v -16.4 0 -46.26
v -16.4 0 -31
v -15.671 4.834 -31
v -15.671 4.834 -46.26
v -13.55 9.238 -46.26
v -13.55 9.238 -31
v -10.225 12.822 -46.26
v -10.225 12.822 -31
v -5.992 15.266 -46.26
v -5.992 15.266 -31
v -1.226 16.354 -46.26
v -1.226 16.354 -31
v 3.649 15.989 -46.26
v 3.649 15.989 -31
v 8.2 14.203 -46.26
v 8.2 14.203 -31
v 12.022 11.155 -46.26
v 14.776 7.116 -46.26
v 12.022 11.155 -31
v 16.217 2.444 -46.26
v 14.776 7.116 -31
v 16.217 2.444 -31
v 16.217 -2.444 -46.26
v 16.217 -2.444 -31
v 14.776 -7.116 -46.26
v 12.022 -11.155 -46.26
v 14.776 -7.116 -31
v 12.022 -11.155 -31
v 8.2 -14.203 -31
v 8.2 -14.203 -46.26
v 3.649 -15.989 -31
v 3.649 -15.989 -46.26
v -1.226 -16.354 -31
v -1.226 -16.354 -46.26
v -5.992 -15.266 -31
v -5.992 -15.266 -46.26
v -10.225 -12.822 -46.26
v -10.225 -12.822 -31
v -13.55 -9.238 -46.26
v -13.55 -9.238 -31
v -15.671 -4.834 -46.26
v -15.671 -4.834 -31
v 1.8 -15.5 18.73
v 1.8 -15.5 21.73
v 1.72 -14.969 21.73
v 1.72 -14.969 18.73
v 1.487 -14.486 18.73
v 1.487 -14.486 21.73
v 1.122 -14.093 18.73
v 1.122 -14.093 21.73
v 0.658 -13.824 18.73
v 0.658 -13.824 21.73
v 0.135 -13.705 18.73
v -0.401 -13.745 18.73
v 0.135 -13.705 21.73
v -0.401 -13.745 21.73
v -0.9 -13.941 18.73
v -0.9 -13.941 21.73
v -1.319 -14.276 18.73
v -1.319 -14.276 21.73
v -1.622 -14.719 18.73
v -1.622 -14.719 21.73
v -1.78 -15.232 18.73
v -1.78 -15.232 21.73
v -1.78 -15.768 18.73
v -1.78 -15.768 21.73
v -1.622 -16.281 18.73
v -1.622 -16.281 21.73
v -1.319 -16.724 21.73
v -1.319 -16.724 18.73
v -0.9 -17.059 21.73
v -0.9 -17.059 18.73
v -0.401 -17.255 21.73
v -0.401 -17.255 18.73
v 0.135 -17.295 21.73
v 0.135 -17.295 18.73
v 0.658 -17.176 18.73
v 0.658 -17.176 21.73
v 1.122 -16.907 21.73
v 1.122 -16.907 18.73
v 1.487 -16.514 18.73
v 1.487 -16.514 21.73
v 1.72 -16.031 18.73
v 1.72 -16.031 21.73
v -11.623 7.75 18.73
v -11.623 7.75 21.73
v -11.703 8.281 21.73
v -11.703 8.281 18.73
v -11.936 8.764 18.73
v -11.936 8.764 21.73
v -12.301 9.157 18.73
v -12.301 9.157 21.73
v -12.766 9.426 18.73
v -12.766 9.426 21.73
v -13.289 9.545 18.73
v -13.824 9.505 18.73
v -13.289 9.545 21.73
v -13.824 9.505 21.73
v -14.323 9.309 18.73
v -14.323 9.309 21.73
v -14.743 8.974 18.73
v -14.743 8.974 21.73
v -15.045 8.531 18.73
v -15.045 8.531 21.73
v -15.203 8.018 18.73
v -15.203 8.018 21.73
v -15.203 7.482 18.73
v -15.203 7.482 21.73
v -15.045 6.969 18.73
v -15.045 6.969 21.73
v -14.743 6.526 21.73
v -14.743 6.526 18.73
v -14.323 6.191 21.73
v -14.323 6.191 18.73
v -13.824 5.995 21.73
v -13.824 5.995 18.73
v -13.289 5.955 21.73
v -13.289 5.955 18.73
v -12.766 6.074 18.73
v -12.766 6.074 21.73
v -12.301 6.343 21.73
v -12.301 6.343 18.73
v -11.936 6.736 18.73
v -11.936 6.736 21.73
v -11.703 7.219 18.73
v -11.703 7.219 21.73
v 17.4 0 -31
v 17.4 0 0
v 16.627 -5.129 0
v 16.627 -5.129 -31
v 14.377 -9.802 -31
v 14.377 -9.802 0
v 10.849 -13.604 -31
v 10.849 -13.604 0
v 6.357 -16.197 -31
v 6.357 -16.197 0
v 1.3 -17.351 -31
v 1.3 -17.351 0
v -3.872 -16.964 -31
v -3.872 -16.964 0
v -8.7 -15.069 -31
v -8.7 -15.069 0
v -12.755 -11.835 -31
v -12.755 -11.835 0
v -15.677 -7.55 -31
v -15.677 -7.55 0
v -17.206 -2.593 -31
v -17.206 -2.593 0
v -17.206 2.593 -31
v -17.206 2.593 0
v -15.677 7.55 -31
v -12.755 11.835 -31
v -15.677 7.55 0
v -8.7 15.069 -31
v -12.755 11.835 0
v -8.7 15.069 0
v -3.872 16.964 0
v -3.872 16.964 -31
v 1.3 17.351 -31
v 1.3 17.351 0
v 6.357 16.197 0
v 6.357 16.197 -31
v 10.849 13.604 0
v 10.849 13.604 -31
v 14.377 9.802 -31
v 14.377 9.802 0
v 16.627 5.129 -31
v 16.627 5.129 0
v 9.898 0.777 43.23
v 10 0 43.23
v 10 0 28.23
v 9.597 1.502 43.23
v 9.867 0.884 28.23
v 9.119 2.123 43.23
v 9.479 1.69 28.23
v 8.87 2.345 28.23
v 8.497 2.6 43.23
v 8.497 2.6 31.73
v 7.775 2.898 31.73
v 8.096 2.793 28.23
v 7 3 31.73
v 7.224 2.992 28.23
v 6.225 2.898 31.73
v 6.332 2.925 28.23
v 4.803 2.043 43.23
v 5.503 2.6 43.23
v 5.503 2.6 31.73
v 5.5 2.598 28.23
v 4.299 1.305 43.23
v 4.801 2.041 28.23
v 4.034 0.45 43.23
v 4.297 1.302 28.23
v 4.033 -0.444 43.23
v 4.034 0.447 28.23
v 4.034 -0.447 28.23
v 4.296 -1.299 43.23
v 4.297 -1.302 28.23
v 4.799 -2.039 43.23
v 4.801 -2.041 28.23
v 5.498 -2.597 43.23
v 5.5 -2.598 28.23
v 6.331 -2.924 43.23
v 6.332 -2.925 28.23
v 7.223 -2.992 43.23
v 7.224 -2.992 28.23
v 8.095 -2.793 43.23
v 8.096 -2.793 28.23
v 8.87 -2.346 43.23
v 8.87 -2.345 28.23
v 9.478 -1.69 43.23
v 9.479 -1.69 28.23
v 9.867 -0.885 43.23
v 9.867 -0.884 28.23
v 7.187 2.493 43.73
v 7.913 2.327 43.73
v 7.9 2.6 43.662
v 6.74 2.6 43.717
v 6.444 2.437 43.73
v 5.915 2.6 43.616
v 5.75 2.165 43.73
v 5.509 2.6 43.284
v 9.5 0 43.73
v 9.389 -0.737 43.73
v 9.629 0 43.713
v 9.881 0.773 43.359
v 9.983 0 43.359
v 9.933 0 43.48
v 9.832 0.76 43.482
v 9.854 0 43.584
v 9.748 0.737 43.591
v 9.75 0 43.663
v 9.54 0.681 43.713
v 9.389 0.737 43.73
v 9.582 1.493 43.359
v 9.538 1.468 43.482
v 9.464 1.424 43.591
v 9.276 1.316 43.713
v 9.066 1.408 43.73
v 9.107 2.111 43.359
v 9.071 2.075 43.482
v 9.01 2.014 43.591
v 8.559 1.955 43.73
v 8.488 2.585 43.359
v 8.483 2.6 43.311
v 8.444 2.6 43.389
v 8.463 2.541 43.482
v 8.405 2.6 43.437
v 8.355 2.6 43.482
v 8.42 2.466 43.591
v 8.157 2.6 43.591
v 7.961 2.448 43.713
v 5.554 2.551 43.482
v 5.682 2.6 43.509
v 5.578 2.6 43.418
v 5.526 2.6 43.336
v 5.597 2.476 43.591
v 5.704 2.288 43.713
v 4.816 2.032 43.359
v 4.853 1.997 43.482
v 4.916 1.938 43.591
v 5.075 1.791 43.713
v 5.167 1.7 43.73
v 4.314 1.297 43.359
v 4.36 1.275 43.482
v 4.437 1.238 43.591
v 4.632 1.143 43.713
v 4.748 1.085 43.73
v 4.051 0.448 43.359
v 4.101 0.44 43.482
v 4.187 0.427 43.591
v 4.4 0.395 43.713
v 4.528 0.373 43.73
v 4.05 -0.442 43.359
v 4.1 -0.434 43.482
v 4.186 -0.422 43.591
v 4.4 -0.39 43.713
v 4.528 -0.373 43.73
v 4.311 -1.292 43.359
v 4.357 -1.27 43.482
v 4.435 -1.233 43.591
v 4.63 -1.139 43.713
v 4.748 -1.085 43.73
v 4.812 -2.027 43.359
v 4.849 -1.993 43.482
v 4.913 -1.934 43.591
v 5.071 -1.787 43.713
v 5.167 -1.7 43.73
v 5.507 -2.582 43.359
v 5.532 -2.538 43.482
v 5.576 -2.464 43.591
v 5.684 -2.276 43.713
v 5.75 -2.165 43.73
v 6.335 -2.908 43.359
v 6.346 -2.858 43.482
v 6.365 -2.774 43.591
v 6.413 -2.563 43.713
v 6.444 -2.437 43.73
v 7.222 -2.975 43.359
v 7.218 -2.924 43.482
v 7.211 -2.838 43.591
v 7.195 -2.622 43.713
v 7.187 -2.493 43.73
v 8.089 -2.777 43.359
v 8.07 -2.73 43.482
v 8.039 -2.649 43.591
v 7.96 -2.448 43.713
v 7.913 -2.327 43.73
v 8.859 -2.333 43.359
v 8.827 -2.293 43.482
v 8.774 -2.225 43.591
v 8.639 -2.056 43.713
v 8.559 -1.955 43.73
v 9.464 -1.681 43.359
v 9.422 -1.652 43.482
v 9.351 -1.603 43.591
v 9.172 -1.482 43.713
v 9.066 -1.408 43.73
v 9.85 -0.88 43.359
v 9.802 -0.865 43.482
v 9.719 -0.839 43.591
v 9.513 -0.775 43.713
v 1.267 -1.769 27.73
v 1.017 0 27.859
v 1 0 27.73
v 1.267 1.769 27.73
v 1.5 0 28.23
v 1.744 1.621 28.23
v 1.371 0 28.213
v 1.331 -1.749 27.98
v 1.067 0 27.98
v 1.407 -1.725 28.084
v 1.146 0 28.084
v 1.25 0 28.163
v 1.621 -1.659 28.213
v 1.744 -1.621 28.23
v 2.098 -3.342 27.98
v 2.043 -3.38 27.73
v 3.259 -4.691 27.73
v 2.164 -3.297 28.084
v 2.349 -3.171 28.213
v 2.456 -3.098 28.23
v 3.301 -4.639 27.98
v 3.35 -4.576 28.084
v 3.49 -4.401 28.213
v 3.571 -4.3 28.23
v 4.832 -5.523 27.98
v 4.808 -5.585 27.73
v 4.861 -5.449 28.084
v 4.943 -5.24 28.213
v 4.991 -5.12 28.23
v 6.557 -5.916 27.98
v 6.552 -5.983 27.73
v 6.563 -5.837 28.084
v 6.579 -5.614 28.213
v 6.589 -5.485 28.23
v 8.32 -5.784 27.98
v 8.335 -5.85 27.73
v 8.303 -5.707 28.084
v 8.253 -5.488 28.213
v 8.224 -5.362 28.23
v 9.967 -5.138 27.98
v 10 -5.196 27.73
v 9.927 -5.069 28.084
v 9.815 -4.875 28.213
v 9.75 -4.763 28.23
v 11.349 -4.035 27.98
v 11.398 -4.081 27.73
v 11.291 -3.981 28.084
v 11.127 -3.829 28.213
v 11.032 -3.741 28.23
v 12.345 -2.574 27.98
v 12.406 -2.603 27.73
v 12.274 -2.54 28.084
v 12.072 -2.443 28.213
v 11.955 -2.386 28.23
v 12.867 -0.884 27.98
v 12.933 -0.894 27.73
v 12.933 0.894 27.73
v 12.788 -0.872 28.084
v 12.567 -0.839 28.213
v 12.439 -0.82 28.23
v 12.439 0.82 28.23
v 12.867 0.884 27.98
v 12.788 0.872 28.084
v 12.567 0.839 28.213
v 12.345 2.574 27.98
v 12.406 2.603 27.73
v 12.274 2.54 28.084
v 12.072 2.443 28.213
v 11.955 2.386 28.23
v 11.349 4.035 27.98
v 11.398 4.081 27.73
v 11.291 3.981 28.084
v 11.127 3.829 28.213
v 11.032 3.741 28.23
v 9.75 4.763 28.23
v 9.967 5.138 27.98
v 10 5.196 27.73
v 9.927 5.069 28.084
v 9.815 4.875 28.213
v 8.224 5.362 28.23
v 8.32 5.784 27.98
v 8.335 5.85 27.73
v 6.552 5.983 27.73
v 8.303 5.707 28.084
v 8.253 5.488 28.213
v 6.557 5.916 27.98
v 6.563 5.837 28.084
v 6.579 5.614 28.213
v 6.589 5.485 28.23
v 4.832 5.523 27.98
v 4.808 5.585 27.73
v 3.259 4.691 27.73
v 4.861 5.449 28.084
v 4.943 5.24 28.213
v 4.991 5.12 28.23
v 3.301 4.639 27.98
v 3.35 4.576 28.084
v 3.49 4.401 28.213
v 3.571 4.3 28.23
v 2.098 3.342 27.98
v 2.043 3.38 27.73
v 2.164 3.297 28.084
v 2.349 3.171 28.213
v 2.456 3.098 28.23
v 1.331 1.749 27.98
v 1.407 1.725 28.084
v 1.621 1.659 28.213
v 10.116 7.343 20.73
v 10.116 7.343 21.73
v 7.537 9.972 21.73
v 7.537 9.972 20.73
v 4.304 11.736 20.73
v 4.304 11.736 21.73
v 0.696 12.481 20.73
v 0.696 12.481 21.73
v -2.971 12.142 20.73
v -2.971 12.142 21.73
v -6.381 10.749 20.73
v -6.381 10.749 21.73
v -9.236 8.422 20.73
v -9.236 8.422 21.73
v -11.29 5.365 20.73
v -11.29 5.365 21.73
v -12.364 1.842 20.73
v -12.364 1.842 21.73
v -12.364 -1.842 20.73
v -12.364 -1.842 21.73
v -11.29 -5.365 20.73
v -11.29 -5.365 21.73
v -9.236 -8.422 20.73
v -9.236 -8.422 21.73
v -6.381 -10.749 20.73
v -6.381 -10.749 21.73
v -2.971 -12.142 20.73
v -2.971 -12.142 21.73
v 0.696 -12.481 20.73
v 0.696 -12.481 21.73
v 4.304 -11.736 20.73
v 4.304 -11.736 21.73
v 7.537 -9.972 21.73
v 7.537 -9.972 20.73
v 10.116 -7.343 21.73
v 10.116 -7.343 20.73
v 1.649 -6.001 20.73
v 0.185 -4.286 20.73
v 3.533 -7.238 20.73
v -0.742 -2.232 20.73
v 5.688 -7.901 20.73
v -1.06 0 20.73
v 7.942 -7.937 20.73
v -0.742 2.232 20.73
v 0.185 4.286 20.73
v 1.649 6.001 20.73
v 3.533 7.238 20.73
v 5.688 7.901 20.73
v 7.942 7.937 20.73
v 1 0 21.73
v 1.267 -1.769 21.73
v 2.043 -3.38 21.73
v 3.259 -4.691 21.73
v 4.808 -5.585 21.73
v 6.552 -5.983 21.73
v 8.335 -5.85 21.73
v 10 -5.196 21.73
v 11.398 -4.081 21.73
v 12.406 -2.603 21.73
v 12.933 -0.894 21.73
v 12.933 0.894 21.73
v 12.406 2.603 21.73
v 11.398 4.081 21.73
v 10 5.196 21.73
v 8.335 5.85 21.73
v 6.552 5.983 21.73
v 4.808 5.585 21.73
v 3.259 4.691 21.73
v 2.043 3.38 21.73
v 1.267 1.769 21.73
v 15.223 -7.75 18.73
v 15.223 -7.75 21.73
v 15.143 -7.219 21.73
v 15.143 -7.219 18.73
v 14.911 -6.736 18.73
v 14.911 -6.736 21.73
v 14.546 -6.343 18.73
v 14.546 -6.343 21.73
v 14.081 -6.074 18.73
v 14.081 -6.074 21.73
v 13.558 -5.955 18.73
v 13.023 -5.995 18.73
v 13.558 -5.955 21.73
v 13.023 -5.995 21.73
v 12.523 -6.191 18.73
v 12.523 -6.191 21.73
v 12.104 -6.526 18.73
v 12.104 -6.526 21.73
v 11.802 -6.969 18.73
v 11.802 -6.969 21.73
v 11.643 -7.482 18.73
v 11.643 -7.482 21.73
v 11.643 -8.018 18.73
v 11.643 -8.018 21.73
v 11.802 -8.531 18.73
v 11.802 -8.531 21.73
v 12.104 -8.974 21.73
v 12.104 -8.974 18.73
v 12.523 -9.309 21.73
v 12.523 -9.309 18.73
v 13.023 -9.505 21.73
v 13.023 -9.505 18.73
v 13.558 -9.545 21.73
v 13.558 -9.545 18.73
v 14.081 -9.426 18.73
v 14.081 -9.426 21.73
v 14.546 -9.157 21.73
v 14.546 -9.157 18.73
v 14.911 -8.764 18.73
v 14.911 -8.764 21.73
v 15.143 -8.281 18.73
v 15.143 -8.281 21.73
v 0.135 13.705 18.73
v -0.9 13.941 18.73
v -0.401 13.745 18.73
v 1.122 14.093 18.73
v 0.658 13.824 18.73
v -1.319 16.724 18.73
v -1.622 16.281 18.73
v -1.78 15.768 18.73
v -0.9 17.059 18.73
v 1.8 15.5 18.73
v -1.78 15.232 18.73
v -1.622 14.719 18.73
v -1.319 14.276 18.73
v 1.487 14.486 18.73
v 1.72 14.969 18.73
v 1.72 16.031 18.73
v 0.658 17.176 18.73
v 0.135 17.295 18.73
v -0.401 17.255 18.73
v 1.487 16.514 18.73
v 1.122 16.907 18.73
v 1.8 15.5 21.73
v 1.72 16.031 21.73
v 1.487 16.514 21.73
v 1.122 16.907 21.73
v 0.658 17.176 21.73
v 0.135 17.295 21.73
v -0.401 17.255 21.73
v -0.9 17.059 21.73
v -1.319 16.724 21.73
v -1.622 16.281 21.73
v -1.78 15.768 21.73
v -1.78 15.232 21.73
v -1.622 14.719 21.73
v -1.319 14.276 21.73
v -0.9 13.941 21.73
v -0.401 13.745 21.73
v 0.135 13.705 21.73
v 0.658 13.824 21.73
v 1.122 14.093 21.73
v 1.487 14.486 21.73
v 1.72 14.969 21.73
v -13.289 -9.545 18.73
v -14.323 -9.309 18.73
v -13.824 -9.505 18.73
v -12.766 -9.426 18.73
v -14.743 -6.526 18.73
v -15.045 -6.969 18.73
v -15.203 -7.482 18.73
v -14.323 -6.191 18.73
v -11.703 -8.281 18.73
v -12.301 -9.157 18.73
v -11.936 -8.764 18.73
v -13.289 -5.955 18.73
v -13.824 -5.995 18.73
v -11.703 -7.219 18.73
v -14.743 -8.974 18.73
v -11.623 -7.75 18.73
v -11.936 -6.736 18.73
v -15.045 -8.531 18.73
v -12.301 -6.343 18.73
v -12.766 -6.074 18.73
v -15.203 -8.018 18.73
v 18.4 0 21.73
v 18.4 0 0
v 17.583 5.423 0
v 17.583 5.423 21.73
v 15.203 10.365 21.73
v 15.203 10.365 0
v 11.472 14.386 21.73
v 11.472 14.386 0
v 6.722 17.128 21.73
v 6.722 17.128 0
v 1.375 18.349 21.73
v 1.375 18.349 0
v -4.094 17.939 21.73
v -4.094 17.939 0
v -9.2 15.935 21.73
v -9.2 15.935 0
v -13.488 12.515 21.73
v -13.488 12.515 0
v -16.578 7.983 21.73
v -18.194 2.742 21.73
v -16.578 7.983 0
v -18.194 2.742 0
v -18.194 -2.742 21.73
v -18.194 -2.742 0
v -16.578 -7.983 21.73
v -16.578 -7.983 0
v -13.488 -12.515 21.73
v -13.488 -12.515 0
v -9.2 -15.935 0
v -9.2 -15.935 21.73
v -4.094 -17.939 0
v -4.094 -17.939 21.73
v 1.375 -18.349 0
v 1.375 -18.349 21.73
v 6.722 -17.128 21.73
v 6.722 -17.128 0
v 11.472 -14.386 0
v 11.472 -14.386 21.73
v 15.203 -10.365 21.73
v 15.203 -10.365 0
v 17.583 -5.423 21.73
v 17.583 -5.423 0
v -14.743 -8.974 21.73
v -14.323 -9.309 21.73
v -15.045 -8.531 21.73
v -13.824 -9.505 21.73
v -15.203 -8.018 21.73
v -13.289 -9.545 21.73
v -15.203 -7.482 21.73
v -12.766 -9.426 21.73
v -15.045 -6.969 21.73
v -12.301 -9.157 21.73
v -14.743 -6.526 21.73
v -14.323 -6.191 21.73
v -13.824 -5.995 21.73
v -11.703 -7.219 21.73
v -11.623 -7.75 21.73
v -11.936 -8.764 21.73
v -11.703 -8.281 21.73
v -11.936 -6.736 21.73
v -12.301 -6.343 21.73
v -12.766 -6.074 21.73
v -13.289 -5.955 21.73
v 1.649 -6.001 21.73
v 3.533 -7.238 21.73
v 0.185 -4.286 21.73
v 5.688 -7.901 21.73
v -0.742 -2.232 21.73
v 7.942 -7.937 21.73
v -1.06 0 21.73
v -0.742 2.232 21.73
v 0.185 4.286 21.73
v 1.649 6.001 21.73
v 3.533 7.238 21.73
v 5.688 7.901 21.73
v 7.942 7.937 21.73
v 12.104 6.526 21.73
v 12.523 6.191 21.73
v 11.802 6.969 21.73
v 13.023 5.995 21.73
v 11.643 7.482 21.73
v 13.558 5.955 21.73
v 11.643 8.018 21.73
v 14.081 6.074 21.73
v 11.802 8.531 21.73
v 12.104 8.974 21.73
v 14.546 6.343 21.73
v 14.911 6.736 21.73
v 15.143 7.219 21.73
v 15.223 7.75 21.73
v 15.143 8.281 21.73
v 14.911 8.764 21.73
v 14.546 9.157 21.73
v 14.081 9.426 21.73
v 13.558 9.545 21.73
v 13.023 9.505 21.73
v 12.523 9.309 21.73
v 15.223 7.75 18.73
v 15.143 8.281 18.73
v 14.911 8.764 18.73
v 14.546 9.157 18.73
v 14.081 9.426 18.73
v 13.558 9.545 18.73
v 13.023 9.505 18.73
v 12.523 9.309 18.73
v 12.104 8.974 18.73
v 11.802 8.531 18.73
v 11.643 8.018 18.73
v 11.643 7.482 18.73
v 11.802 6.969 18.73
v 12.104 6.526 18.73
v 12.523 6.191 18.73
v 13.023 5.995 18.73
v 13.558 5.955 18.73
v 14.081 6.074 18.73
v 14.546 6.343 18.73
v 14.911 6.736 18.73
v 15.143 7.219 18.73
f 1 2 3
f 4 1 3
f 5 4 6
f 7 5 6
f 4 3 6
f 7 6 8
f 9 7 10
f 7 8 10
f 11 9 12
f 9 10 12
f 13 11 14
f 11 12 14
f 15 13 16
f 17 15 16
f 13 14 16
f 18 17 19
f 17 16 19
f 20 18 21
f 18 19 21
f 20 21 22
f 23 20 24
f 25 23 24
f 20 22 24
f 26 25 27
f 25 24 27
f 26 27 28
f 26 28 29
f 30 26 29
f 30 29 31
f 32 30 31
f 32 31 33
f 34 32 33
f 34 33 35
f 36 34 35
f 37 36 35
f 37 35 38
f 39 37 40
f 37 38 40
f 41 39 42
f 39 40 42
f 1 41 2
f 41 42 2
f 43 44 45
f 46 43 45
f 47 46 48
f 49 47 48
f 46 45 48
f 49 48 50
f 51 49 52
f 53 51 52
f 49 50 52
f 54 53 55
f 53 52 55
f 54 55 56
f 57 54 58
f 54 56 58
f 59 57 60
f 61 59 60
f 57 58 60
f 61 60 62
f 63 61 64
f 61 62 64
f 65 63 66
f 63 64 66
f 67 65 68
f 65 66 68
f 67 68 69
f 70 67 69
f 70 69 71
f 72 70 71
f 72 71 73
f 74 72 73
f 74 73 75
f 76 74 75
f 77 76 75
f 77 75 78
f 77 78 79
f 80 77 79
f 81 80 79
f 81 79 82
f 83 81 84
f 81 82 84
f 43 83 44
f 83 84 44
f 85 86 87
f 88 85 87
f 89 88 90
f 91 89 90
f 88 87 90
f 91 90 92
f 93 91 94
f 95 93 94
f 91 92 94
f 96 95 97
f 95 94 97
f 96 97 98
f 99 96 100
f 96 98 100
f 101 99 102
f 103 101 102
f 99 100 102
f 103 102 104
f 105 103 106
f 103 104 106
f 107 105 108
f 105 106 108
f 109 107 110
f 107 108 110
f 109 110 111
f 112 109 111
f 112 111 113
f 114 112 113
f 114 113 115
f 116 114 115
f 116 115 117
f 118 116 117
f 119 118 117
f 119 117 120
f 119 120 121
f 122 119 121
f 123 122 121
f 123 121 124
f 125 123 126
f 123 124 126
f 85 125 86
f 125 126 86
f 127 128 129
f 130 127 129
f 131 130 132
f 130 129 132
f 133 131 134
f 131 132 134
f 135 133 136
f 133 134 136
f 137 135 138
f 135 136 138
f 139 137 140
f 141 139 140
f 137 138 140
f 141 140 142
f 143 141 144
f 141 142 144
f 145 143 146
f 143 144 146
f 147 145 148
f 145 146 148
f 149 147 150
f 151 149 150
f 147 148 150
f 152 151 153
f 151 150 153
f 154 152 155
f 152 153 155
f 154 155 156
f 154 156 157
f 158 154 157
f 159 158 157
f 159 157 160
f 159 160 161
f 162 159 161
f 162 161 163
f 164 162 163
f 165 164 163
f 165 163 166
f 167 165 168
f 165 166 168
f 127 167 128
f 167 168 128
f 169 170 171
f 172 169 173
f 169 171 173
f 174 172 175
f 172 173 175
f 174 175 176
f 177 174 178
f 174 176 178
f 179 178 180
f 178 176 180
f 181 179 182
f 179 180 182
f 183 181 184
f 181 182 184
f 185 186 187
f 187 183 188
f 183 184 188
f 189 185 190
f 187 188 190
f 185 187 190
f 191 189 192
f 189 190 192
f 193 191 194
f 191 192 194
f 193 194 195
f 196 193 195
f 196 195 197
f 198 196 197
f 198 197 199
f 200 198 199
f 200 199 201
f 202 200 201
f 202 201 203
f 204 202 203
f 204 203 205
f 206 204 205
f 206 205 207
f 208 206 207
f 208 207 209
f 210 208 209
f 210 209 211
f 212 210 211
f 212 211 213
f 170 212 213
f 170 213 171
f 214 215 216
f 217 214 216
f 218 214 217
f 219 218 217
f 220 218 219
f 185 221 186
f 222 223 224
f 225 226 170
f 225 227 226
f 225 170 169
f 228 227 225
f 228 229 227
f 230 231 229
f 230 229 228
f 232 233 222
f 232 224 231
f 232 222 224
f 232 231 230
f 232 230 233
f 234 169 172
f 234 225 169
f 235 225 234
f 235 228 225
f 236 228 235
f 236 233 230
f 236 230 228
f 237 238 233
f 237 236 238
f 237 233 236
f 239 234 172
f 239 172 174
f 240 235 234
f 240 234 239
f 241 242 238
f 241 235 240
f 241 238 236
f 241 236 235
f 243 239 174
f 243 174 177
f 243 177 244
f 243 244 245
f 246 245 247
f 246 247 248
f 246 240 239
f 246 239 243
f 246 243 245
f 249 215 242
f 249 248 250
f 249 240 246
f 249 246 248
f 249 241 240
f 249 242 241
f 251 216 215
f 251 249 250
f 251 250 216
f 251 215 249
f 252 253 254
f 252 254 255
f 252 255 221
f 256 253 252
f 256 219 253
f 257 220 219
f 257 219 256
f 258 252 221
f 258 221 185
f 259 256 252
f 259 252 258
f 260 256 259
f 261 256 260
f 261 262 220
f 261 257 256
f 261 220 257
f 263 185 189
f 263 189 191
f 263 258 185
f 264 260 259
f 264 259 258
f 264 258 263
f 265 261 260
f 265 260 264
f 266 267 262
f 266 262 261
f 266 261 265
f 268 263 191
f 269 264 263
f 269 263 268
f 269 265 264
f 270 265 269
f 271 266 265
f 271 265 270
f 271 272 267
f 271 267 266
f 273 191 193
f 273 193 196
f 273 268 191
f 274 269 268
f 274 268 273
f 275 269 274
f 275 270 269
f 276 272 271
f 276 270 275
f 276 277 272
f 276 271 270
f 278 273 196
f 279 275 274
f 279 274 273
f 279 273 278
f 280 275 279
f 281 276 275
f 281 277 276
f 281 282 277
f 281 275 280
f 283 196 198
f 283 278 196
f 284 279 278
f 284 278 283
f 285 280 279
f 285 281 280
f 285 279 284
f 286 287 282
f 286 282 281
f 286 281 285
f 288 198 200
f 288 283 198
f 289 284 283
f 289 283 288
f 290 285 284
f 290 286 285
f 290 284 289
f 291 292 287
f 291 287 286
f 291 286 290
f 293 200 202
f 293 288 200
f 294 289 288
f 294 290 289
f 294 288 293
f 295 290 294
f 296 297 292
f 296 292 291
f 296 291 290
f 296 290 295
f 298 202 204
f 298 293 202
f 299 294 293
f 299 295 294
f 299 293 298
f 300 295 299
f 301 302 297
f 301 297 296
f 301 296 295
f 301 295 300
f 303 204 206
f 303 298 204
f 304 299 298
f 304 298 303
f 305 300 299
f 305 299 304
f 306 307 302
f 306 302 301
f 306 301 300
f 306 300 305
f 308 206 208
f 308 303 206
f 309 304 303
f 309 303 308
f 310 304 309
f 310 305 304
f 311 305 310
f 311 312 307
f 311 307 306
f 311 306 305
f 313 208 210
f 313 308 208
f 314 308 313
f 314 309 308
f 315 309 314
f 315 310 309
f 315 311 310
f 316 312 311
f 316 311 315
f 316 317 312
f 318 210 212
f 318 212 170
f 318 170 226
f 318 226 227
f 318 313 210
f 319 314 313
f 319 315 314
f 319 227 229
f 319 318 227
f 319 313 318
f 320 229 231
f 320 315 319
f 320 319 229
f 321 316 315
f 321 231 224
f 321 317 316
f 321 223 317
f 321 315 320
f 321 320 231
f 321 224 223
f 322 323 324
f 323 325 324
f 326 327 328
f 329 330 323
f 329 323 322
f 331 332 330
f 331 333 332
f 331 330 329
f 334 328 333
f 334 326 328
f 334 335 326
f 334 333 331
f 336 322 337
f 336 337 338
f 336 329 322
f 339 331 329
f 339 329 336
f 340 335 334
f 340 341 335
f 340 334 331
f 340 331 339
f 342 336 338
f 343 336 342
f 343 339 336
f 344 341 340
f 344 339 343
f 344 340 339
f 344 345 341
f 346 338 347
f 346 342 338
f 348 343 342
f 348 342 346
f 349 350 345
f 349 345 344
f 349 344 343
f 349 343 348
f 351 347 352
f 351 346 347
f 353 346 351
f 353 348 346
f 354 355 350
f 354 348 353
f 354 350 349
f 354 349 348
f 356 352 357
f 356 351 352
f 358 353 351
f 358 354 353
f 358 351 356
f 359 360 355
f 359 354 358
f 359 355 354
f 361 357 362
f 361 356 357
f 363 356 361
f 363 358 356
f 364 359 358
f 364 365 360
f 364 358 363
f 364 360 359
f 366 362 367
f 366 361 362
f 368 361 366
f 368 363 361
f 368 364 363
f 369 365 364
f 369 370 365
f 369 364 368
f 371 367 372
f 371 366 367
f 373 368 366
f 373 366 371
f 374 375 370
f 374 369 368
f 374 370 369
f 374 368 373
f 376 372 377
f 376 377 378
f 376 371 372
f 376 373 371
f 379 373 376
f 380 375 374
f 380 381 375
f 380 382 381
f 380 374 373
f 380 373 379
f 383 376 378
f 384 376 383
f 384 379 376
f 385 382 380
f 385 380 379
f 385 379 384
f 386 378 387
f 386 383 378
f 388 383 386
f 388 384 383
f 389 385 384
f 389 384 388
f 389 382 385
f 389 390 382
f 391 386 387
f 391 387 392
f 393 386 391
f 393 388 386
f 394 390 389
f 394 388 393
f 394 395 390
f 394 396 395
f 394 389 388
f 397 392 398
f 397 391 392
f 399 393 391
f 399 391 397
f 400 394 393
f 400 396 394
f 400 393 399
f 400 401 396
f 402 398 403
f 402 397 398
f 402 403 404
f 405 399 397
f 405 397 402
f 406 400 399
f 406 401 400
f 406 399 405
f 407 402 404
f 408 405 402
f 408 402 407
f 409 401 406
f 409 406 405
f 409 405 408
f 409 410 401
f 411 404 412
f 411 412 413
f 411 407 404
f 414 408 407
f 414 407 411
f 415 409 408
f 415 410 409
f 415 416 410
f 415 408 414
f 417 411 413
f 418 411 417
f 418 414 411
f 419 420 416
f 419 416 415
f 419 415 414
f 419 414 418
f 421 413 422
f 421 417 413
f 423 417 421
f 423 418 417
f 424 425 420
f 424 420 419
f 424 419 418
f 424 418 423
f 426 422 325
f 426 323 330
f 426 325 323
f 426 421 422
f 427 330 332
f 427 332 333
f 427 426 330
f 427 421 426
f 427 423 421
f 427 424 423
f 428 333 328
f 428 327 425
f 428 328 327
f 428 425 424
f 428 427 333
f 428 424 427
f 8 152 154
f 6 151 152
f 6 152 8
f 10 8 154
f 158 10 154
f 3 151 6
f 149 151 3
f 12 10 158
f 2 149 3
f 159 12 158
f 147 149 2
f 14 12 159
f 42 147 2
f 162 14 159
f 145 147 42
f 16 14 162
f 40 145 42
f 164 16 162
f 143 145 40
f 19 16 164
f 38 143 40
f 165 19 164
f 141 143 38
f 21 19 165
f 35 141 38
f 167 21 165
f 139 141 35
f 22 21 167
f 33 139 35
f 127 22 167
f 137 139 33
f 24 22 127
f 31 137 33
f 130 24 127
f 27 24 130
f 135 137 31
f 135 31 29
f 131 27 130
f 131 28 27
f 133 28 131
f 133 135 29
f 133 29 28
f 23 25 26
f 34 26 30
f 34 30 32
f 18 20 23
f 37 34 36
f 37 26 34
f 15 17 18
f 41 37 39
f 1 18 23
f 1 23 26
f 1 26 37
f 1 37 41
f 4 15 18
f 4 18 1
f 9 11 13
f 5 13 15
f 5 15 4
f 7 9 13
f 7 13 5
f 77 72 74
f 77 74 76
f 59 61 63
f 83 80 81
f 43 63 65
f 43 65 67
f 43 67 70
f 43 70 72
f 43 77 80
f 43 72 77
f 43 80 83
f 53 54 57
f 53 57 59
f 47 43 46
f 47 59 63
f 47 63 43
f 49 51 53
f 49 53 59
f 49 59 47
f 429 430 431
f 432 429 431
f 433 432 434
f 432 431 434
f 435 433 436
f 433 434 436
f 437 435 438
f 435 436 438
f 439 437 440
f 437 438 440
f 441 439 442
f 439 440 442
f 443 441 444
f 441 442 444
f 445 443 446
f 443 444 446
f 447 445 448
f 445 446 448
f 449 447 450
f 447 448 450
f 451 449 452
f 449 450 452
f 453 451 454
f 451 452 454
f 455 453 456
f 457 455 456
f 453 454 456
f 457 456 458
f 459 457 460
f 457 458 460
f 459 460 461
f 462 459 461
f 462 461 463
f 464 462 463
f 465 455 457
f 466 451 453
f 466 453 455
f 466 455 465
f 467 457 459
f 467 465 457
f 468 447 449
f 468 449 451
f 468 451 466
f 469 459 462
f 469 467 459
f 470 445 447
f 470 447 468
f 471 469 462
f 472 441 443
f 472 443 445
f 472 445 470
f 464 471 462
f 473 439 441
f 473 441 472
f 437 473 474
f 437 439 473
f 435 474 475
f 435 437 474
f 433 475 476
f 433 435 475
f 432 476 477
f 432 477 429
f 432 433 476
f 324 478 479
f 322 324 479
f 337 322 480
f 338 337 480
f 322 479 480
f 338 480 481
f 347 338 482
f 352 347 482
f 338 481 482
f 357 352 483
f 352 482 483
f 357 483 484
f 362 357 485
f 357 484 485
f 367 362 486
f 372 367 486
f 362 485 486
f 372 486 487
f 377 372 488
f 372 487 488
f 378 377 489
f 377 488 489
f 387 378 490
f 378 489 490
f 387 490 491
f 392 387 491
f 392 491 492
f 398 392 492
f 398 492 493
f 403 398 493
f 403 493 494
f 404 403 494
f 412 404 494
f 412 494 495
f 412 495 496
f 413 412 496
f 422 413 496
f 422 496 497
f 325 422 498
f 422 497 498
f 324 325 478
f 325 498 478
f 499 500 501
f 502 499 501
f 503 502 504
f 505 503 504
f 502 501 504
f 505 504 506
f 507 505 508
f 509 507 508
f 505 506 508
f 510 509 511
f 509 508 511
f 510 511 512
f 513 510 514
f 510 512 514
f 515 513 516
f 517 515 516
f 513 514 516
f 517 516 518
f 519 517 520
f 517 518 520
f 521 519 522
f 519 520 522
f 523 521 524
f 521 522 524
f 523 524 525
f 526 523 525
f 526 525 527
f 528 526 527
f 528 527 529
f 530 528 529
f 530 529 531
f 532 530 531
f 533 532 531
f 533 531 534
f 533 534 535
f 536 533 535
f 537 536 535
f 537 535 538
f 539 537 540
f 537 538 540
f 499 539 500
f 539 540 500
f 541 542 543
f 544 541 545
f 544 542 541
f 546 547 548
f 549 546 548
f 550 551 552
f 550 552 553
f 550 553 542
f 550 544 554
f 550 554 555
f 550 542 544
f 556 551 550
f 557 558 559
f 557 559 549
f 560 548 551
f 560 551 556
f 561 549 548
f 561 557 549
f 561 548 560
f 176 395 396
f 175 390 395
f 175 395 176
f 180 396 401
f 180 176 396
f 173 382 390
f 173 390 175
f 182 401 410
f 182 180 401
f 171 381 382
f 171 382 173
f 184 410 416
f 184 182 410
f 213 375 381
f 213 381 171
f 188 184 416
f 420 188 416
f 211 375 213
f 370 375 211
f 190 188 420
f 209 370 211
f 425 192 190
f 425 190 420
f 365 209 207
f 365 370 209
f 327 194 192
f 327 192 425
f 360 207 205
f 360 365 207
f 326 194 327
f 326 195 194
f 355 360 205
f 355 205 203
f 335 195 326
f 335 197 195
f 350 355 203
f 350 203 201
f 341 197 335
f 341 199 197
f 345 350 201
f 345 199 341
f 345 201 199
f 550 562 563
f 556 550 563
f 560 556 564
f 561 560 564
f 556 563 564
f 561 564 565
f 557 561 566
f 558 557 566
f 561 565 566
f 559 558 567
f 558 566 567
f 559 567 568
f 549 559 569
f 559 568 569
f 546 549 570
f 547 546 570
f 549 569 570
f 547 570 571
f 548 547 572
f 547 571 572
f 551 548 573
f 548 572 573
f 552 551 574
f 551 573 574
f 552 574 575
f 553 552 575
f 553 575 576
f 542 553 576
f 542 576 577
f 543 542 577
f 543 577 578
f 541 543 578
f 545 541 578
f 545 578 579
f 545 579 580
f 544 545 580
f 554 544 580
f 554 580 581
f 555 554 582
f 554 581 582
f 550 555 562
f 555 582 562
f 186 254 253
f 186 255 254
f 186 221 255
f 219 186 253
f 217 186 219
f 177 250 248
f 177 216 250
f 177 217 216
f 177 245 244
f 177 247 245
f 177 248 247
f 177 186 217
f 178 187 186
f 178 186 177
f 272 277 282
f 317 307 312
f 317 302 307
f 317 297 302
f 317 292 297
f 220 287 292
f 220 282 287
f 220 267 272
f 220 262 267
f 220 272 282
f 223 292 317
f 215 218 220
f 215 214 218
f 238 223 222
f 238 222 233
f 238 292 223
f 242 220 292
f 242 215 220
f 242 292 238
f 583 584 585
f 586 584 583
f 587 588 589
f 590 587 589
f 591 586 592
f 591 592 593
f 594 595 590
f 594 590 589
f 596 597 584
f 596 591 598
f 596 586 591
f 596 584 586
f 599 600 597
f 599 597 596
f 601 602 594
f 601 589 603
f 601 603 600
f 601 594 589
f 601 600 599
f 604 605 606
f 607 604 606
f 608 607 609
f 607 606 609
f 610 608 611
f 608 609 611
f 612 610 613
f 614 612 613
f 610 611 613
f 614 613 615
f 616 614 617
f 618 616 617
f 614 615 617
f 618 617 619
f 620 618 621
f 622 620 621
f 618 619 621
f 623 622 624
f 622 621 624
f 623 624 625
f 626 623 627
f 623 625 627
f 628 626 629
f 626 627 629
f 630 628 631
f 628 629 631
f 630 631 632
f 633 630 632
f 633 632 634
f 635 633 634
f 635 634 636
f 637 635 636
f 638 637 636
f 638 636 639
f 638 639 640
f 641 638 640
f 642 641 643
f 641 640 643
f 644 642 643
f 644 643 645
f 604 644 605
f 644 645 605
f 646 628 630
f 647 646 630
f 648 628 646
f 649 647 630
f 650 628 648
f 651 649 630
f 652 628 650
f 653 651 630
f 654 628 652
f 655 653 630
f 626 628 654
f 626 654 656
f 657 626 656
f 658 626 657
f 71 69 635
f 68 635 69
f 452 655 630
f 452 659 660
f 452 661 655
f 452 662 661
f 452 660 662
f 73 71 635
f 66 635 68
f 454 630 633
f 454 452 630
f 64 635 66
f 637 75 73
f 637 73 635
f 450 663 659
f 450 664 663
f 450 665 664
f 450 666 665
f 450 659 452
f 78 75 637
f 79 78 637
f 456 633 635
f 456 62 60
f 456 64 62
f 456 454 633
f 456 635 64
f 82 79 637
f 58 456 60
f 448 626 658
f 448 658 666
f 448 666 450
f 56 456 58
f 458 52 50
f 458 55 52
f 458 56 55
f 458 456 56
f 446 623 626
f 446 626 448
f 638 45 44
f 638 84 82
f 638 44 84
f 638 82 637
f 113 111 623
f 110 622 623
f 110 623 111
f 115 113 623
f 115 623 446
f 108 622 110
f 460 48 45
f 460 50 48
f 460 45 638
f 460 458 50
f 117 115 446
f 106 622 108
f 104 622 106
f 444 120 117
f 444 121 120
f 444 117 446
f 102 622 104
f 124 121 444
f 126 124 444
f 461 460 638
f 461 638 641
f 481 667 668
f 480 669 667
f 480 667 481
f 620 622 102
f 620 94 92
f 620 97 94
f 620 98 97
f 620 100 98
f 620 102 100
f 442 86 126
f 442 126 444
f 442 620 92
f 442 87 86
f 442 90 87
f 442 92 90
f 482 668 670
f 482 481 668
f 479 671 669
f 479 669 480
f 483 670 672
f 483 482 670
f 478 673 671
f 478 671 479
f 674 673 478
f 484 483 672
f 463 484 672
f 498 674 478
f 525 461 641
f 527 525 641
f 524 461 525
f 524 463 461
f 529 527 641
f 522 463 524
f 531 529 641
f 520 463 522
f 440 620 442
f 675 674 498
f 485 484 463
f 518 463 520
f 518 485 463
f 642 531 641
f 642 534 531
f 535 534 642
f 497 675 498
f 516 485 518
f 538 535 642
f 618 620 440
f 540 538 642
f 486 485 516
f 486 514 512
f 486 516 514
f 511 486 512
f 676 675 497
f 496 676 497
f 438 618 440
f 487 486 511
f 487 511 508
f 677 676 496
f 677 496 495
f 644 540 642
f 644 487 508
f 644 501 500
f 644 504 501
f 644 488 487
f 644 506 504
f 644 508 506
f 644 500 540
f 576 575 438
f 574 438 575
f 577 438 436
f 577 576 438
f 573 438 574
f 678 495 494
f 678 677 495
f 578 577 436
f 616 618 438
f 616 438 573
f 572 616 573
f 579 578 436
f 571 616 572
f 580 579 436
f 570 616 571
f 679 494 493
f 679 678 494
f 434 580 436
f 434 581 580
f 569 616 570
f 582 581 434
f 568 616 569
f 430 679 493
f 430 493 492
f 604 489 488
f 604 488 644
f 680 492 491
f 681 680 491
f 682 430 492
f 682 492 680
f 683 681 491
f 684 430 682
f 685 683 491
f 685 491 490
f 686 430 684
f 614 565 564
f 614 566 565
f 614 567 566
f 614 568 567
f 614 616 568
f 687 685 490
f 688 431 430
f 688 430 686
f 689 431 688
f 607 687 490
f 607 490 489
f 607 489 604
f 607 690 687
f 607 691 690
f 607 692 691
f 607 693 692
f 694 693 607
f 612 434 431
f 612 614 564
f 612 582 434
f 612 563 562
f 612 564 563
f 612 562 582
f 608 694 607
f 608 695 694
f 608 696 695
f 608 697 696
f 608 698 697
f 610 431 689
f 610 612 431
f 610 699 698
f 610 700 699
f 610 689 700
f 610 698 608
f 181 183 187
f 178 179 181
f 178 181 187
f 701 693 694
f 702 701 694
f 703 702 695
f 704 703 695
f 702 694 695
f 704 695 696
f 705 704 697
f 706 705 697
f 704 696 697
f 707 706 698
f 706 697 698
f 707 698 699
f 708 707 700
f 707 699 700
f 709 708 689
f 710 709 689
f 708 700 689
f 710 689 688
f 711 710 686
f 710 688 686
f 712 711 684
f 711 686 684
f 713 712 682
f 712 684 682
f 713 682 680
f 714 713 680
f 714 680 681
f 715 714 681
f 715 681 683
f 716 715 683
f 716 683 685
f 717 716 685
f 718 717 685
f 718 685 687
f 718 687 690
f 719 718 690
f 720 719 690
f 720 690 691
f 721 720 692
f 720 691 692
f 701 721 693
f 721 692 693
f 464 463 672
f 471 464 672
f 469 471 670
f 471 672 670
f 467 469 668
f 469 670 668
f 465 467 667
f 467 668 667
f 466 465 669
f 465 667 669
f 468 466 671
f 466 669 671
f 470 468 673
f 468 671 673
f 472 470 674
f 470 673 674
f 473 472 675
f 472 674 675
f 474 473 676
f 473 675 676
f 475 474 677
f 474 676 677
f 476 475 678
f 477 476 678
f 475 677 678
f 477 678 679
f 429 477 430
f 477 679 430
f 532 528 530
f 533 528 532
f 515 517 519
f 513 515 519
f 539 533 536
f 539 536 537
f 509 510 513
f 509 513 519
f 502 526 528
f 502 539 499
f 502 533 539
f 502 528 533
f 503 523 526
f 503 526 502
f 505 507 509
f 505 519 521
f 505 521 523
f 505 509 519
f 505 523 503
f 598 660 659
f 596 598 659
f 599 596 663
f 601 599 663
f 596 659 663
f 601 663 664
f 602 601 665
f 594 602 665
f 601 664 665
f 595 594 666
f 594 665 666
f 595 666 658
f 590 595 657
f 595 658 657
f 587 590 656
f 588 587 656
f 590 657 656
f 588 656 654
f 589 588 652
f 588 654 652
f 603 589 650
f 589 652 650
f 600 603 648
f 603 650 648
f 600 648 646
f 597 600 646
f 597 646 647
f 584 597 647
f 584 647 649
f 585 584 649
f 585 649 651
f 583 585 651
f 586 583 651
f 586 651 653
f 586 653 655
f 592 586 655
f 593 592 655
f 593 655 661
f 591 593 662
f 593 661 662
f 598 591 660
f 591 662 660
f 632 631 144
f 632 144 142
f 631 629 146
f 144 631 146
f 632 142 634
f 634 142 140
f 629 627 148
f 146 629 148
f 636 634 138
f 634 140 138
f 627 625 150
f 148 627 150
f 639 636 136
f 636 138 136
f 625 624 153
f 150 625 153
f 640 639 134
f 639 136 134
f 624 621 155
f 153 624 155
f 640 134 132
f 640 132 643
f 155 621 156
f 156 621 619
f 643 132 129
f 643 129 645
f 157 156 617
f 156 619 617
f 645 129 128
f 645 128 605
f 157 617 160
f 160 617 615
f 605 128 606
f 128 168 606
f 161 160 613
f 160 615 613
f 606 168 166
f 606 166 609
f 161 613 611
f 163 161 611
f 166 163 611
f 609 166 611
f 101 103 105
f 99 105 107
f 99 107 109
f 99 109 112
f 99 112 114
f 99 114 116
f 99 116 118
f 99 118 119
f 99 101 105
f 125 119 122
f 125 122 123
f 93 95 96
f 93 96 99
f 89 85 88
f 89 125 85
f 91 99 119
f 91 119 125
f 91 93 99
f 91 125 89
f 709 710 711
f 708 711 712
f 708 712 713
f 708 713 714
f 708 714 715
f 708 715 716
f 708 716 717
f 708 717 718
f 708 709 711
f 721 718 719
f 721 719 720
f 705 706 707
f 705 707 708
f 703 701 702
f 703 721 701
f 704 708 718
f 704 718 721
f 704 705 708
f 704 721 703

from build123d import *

# Parameters (mm, degrees)
SKETCH1_R            = 18.4
BOSS_EXTRUDE1_DEPTH  = 21.73
SKETCH2_R            = 17.4
BOSS_EXTRUDE2_DEPTH  = 31
SKETCH3_R            = 6
BOSS_EXTRUDE3_DEPTH  = 6.5
FILLET1_R            = 0.5
SKETCH4_R            = 3
BOSS_EXTRUDE4_DEPTH  = 15.5
CUT_EXTRUDE1_START   = -12
CUT_EXTRUDE1_DEPTH   = 12
CUT_EXTRUDE2_DEPTH   = 1
SKETCH9_R            = 4
BOSS_EXTRUDE5_DEPTH  = 1
FILLET2_R            = 0.5
SKETCH10_R           = 14
BOSS_EXTRUDE6_DEPTH  = 1.5
SKETCH11_W           = 3.5
SKETCH11_H           = 1
BOSS_EXTRUDE7_DEPTH  = 5.6
FILLET3_R            = 0.5
SKETCH13_R           = 9
BOSS_EXTRUDE8_DEPTH  = 3
SKETCH14_R           = 1.5
BOSS_EXTRUDE9_DEPTH  = 8.55
FILLET4_R            = 0.5
SKETCH15_R           = 16.4
BOSS_EXTRUDE10_DEPTH = 15.26
SKETCH17_R           = 1.8
CUT_EXTRUDE3_DEPTH   = 3


with BuildPart() as part:
    # Sketch1 → Boss-Extrude1 (new body)
    with BuildSketch(Plane.XY):
        Circle(SKETCH1_R)
    extrude(amount=BOSS_EXTRUDE1_DEPTH)

    # Sketch2 → Boss-Extrude2 (add)
    with BuildSketch(Plane(origin=(0, 0, 0), x_dir=(-1, 0, 0), z_dir=(0, 0, -1))):
        with Locations(Location((0, 0, 0), (0, 0, 180))):
            Circle(SKETCH2_R)
    extrude(amount=BOSS_EXTRUDE2_DEPTH)

    # Sketch3 → Boss-Extrude3 (add)
    with BuildSketch(Plane.XY.offset(21.73)):
        with Locations(Location((7, 0, 0), (0, 0, 180))):
            Circle(SKETCH3_R)
    extrude(amount=BOSS_EXTRUDE3_DEPTH)

    # Fillet1
    fillet1_edges = [part.edges().sort_by_distance(p)[0] for p in [
        (13, 0, 28.23),
    ]]
    fillet(fillet1_edges, radius=FILLET1_R)

    # Sketch4 → Boss-Extrude4 (add)
    with BuildSketch(Plane.XY.offset(28.23)):
        with Locations((7, 0)):
            Circle(SKETCH4_R)
    extrude(amount=BOSS_EXTRUDE4_DEPTH)

    # Sketch5 → Cut-Extrude1 (cut)
    with BuildSketch(Plane.XY.offset(43.73).offset(CUT_EXTRUDE1_START)):
        with BuildLine():
            Line((5.503337045, 2.6), (8.496662955, 2.6))
            ThreePointArc((8.496662955, 2.6), (7, 3), (5.503337045, 2.6))
        make_face()
    extrude(amount=CUT_EXTRUDE1_DEPTH, mode=Mode.SUBTRACT)

    # Sketch8 → Cut-Extrude2 (cut)
    with BuildSketch(Plane.XY.offset(21.73)):
        with BuildLine():
            ThreePointArc((10.116155685, 7.342574083), (-12.5, 0), (10.116155685, -7.342574083))
            ThreePointArc((10.116155685, -7.342574083), (-1.05978604, 0), (10.116155685, 7.342574083))
        make_face()
    extrude(amount=-CUT_EXTRUDE2_DEPTH, mode=Mode.SUBTRACT)

    # Sketch9 → Boss-Extrude5 (add)
    with BuildSketch(Plane(origin=(0, 0, -31), x_dir=(-1, 0, 0), z_dir=(0, 0, -1))):
        Circle(SKETCH9_R)
    extrude(amount=BOSS_EXTRUDE5_DEPTH)

    # Fillet2
    fillet2_edges = [part.edges().sort_by_distance(p)[0] for p in [
        (4, 0, -32),
    ]]
    fillet(fillet2_edges, radius=FILLET2_R)

    # Sketch11 → Boss-Extrude7 (add)
    with BuildSketch(Plane(origin=(0, 0, -31), x_dir=(-1, 0, 0), z_dir=(0, 0, -1))):
        with Locations((0, 12.05)):
            Rectangle(SKETCH11_W, SKETCH11_H)
        with Locations((0, -12.05)):
            Rectangle(SKETCH11_W, SKETCH11_H)
    extrude(amount=BOSS_EXTRUDE7_DEPTH)

    # Fillet3
    fillet3_edges = [part.edges().sort_by_distance(p)[0] for p in [
        (1.75, 12.05, -36.6),
        (-1.75, 12.05, -36.6),
        (-1.75, -12.05, -36.6),
        (1.75, -12.05, -36.6),
    ]]
    fillet(fillet3_edges, radius=FILLET3_R)

    # Sketch14 → Boss-Extrude9 (add)
    with BuildSketch(Plane(origin=(0, 0, -32), x_dir=(-1, 0, 0), z_dir=(0, 0, -1))):
        Circle(SKETCH14_R)
    extrude(amount=BOSS_EXTRUDE9_DEPTH)

    # Fillet4
    # the kernel refuses this fillet: 0.5 mm, written as the material it takes off along each edge
    with BuildSketch(Plane(origin=(7, 0, 43.73), x_dir=(0.4622655728594592, 0.8867415295050277, 0), z_dir=(0.8867415295050277, -0.4622655728594592, 0))) as fillet4_piece_1:
        with BuildLine():
            CenterArc((3 - FILLET4_R, -FILLET4_R), FILLET4_R, 0, 90)
            Line((3 - FILLET4_R, 0), (3 - FILLET4_R, FILLET4_R * 0.02))
            Line((3 - FILLET4_R, FILLET4_R * 0.02), (3 + FILLET4_R * 0.02, FILLET4_R * 0.02))
            Line((3 + FILLET4_R * 0.02, FILLET4_R * 0.02), (3 + FILLET4_R * 0.02, -FILLET4_R))
            Line((3 + FILLET4_R * 0.02, -FILLET4_R), (3, -FILLET4_R))
        make_face()
    revolve(axis=Axis((7, 0, 43.73), (0, 0, 1)), revolution_arc=297.533397677, mode=Mode.SUBTRACT)
    with BuildSketch(Plane(origin=(7, 0, 43.73), x_dir=(1, 0, 0), z_dir=(0, -1, 0))) as fillet4_piece_2:
        with BuildLine():
            CenterArc((3 - FILLET4_R, -FILLET4_R), FILLET4_R, 0, 90)
            Line((3 - FILLET4_R, 0), (3 - FILLET4_R, FILLET4_R * 0.02))
            Line((3 - FILLET4_R, FILLET4_R * 0.02), (3 + FILLET4_R * 0.02, FILLET4_R * 0.02))
            Line((3 + FILLET4_R * 0.02, FILLET4_R * 0.02), (3 + FILLET4_R * 0.02, -FILLET4_R))
            Line((3 + FILLET4_R * 0.02, -FILLET4_R), (3, -FILLET4_R))
        make_face()
    revolve(axis=Axis((7, 0, 43.73), (0, 0, 1)), revolution_arc=117.379597562, mode=Mode.SUBTRACT)



with BuildPart() as body_2:
    # Sketch10 → Boss-Extrude6 (new body)
    with BuildSketch(Plane(origin=(0, 0, -34), x_dir=(-1, 0, 0), z_dir=(0, 0, -1))):
        Circle(SKETCH10_R)
    extrude(amount=BOSS_EXTRUDE6_DEPTH)


with BuildPart() as body_3:
    # Sketch13 → Boss-Extrude8 (new body)
    with BuildSketch(Plane(origin=(0, 0, -37.5), x_dir=(-1, 0, 0), z_dir=(0, 0, -1))):
        Circle(SKETCH13_R)
    extrude(amount=BOSS_EXTRUDE8_DEPTH)


with BuildPart() as part_1:
    add(part.part)

    add(body_2.part)  # Boss-Extrude10 merges body 2

    add(body_3.part)  # Boss-Extrude10 merges body 3
    # Sketch15 → Boss-Extrude10 (add)
    with BuildSketch(Plane(origin=(0, 0, -31), x_dir=(-1, 0, 0), z_dir=(0, 0, -1))):
        Circle(SKETCH15_R)
    extrude(amount=BOSS_EXTRUDE10_DEPTH)

    # Sketch17 → Cut-Extrude3 (cut)
    with BuildSketch(Plane.XY.offset(21.73)):
        with Locations((0, -15.5)):
            Circle(SKETCH17_R)
        with Locations((-13.423393759, -7.75)):
            Circle(SKETCH17_R)
        with Locations((-13.423393759, 7.75)):
            Circle(SKETCH17_R)
        with Locations((0, 15.5)):
            Circle(SKETCH17_R)
        with Locations((13.423393759, 7.75)):
            Circle(SKETCH17_R)
        with Locations((13.423393759, -7.75)):
            Circle(SKETCH17_R)
    extrude(amount=-CUT_EXTRUDE3_DEPTH, mode=Mode.SUBTRACT)


solid = part_1.part
